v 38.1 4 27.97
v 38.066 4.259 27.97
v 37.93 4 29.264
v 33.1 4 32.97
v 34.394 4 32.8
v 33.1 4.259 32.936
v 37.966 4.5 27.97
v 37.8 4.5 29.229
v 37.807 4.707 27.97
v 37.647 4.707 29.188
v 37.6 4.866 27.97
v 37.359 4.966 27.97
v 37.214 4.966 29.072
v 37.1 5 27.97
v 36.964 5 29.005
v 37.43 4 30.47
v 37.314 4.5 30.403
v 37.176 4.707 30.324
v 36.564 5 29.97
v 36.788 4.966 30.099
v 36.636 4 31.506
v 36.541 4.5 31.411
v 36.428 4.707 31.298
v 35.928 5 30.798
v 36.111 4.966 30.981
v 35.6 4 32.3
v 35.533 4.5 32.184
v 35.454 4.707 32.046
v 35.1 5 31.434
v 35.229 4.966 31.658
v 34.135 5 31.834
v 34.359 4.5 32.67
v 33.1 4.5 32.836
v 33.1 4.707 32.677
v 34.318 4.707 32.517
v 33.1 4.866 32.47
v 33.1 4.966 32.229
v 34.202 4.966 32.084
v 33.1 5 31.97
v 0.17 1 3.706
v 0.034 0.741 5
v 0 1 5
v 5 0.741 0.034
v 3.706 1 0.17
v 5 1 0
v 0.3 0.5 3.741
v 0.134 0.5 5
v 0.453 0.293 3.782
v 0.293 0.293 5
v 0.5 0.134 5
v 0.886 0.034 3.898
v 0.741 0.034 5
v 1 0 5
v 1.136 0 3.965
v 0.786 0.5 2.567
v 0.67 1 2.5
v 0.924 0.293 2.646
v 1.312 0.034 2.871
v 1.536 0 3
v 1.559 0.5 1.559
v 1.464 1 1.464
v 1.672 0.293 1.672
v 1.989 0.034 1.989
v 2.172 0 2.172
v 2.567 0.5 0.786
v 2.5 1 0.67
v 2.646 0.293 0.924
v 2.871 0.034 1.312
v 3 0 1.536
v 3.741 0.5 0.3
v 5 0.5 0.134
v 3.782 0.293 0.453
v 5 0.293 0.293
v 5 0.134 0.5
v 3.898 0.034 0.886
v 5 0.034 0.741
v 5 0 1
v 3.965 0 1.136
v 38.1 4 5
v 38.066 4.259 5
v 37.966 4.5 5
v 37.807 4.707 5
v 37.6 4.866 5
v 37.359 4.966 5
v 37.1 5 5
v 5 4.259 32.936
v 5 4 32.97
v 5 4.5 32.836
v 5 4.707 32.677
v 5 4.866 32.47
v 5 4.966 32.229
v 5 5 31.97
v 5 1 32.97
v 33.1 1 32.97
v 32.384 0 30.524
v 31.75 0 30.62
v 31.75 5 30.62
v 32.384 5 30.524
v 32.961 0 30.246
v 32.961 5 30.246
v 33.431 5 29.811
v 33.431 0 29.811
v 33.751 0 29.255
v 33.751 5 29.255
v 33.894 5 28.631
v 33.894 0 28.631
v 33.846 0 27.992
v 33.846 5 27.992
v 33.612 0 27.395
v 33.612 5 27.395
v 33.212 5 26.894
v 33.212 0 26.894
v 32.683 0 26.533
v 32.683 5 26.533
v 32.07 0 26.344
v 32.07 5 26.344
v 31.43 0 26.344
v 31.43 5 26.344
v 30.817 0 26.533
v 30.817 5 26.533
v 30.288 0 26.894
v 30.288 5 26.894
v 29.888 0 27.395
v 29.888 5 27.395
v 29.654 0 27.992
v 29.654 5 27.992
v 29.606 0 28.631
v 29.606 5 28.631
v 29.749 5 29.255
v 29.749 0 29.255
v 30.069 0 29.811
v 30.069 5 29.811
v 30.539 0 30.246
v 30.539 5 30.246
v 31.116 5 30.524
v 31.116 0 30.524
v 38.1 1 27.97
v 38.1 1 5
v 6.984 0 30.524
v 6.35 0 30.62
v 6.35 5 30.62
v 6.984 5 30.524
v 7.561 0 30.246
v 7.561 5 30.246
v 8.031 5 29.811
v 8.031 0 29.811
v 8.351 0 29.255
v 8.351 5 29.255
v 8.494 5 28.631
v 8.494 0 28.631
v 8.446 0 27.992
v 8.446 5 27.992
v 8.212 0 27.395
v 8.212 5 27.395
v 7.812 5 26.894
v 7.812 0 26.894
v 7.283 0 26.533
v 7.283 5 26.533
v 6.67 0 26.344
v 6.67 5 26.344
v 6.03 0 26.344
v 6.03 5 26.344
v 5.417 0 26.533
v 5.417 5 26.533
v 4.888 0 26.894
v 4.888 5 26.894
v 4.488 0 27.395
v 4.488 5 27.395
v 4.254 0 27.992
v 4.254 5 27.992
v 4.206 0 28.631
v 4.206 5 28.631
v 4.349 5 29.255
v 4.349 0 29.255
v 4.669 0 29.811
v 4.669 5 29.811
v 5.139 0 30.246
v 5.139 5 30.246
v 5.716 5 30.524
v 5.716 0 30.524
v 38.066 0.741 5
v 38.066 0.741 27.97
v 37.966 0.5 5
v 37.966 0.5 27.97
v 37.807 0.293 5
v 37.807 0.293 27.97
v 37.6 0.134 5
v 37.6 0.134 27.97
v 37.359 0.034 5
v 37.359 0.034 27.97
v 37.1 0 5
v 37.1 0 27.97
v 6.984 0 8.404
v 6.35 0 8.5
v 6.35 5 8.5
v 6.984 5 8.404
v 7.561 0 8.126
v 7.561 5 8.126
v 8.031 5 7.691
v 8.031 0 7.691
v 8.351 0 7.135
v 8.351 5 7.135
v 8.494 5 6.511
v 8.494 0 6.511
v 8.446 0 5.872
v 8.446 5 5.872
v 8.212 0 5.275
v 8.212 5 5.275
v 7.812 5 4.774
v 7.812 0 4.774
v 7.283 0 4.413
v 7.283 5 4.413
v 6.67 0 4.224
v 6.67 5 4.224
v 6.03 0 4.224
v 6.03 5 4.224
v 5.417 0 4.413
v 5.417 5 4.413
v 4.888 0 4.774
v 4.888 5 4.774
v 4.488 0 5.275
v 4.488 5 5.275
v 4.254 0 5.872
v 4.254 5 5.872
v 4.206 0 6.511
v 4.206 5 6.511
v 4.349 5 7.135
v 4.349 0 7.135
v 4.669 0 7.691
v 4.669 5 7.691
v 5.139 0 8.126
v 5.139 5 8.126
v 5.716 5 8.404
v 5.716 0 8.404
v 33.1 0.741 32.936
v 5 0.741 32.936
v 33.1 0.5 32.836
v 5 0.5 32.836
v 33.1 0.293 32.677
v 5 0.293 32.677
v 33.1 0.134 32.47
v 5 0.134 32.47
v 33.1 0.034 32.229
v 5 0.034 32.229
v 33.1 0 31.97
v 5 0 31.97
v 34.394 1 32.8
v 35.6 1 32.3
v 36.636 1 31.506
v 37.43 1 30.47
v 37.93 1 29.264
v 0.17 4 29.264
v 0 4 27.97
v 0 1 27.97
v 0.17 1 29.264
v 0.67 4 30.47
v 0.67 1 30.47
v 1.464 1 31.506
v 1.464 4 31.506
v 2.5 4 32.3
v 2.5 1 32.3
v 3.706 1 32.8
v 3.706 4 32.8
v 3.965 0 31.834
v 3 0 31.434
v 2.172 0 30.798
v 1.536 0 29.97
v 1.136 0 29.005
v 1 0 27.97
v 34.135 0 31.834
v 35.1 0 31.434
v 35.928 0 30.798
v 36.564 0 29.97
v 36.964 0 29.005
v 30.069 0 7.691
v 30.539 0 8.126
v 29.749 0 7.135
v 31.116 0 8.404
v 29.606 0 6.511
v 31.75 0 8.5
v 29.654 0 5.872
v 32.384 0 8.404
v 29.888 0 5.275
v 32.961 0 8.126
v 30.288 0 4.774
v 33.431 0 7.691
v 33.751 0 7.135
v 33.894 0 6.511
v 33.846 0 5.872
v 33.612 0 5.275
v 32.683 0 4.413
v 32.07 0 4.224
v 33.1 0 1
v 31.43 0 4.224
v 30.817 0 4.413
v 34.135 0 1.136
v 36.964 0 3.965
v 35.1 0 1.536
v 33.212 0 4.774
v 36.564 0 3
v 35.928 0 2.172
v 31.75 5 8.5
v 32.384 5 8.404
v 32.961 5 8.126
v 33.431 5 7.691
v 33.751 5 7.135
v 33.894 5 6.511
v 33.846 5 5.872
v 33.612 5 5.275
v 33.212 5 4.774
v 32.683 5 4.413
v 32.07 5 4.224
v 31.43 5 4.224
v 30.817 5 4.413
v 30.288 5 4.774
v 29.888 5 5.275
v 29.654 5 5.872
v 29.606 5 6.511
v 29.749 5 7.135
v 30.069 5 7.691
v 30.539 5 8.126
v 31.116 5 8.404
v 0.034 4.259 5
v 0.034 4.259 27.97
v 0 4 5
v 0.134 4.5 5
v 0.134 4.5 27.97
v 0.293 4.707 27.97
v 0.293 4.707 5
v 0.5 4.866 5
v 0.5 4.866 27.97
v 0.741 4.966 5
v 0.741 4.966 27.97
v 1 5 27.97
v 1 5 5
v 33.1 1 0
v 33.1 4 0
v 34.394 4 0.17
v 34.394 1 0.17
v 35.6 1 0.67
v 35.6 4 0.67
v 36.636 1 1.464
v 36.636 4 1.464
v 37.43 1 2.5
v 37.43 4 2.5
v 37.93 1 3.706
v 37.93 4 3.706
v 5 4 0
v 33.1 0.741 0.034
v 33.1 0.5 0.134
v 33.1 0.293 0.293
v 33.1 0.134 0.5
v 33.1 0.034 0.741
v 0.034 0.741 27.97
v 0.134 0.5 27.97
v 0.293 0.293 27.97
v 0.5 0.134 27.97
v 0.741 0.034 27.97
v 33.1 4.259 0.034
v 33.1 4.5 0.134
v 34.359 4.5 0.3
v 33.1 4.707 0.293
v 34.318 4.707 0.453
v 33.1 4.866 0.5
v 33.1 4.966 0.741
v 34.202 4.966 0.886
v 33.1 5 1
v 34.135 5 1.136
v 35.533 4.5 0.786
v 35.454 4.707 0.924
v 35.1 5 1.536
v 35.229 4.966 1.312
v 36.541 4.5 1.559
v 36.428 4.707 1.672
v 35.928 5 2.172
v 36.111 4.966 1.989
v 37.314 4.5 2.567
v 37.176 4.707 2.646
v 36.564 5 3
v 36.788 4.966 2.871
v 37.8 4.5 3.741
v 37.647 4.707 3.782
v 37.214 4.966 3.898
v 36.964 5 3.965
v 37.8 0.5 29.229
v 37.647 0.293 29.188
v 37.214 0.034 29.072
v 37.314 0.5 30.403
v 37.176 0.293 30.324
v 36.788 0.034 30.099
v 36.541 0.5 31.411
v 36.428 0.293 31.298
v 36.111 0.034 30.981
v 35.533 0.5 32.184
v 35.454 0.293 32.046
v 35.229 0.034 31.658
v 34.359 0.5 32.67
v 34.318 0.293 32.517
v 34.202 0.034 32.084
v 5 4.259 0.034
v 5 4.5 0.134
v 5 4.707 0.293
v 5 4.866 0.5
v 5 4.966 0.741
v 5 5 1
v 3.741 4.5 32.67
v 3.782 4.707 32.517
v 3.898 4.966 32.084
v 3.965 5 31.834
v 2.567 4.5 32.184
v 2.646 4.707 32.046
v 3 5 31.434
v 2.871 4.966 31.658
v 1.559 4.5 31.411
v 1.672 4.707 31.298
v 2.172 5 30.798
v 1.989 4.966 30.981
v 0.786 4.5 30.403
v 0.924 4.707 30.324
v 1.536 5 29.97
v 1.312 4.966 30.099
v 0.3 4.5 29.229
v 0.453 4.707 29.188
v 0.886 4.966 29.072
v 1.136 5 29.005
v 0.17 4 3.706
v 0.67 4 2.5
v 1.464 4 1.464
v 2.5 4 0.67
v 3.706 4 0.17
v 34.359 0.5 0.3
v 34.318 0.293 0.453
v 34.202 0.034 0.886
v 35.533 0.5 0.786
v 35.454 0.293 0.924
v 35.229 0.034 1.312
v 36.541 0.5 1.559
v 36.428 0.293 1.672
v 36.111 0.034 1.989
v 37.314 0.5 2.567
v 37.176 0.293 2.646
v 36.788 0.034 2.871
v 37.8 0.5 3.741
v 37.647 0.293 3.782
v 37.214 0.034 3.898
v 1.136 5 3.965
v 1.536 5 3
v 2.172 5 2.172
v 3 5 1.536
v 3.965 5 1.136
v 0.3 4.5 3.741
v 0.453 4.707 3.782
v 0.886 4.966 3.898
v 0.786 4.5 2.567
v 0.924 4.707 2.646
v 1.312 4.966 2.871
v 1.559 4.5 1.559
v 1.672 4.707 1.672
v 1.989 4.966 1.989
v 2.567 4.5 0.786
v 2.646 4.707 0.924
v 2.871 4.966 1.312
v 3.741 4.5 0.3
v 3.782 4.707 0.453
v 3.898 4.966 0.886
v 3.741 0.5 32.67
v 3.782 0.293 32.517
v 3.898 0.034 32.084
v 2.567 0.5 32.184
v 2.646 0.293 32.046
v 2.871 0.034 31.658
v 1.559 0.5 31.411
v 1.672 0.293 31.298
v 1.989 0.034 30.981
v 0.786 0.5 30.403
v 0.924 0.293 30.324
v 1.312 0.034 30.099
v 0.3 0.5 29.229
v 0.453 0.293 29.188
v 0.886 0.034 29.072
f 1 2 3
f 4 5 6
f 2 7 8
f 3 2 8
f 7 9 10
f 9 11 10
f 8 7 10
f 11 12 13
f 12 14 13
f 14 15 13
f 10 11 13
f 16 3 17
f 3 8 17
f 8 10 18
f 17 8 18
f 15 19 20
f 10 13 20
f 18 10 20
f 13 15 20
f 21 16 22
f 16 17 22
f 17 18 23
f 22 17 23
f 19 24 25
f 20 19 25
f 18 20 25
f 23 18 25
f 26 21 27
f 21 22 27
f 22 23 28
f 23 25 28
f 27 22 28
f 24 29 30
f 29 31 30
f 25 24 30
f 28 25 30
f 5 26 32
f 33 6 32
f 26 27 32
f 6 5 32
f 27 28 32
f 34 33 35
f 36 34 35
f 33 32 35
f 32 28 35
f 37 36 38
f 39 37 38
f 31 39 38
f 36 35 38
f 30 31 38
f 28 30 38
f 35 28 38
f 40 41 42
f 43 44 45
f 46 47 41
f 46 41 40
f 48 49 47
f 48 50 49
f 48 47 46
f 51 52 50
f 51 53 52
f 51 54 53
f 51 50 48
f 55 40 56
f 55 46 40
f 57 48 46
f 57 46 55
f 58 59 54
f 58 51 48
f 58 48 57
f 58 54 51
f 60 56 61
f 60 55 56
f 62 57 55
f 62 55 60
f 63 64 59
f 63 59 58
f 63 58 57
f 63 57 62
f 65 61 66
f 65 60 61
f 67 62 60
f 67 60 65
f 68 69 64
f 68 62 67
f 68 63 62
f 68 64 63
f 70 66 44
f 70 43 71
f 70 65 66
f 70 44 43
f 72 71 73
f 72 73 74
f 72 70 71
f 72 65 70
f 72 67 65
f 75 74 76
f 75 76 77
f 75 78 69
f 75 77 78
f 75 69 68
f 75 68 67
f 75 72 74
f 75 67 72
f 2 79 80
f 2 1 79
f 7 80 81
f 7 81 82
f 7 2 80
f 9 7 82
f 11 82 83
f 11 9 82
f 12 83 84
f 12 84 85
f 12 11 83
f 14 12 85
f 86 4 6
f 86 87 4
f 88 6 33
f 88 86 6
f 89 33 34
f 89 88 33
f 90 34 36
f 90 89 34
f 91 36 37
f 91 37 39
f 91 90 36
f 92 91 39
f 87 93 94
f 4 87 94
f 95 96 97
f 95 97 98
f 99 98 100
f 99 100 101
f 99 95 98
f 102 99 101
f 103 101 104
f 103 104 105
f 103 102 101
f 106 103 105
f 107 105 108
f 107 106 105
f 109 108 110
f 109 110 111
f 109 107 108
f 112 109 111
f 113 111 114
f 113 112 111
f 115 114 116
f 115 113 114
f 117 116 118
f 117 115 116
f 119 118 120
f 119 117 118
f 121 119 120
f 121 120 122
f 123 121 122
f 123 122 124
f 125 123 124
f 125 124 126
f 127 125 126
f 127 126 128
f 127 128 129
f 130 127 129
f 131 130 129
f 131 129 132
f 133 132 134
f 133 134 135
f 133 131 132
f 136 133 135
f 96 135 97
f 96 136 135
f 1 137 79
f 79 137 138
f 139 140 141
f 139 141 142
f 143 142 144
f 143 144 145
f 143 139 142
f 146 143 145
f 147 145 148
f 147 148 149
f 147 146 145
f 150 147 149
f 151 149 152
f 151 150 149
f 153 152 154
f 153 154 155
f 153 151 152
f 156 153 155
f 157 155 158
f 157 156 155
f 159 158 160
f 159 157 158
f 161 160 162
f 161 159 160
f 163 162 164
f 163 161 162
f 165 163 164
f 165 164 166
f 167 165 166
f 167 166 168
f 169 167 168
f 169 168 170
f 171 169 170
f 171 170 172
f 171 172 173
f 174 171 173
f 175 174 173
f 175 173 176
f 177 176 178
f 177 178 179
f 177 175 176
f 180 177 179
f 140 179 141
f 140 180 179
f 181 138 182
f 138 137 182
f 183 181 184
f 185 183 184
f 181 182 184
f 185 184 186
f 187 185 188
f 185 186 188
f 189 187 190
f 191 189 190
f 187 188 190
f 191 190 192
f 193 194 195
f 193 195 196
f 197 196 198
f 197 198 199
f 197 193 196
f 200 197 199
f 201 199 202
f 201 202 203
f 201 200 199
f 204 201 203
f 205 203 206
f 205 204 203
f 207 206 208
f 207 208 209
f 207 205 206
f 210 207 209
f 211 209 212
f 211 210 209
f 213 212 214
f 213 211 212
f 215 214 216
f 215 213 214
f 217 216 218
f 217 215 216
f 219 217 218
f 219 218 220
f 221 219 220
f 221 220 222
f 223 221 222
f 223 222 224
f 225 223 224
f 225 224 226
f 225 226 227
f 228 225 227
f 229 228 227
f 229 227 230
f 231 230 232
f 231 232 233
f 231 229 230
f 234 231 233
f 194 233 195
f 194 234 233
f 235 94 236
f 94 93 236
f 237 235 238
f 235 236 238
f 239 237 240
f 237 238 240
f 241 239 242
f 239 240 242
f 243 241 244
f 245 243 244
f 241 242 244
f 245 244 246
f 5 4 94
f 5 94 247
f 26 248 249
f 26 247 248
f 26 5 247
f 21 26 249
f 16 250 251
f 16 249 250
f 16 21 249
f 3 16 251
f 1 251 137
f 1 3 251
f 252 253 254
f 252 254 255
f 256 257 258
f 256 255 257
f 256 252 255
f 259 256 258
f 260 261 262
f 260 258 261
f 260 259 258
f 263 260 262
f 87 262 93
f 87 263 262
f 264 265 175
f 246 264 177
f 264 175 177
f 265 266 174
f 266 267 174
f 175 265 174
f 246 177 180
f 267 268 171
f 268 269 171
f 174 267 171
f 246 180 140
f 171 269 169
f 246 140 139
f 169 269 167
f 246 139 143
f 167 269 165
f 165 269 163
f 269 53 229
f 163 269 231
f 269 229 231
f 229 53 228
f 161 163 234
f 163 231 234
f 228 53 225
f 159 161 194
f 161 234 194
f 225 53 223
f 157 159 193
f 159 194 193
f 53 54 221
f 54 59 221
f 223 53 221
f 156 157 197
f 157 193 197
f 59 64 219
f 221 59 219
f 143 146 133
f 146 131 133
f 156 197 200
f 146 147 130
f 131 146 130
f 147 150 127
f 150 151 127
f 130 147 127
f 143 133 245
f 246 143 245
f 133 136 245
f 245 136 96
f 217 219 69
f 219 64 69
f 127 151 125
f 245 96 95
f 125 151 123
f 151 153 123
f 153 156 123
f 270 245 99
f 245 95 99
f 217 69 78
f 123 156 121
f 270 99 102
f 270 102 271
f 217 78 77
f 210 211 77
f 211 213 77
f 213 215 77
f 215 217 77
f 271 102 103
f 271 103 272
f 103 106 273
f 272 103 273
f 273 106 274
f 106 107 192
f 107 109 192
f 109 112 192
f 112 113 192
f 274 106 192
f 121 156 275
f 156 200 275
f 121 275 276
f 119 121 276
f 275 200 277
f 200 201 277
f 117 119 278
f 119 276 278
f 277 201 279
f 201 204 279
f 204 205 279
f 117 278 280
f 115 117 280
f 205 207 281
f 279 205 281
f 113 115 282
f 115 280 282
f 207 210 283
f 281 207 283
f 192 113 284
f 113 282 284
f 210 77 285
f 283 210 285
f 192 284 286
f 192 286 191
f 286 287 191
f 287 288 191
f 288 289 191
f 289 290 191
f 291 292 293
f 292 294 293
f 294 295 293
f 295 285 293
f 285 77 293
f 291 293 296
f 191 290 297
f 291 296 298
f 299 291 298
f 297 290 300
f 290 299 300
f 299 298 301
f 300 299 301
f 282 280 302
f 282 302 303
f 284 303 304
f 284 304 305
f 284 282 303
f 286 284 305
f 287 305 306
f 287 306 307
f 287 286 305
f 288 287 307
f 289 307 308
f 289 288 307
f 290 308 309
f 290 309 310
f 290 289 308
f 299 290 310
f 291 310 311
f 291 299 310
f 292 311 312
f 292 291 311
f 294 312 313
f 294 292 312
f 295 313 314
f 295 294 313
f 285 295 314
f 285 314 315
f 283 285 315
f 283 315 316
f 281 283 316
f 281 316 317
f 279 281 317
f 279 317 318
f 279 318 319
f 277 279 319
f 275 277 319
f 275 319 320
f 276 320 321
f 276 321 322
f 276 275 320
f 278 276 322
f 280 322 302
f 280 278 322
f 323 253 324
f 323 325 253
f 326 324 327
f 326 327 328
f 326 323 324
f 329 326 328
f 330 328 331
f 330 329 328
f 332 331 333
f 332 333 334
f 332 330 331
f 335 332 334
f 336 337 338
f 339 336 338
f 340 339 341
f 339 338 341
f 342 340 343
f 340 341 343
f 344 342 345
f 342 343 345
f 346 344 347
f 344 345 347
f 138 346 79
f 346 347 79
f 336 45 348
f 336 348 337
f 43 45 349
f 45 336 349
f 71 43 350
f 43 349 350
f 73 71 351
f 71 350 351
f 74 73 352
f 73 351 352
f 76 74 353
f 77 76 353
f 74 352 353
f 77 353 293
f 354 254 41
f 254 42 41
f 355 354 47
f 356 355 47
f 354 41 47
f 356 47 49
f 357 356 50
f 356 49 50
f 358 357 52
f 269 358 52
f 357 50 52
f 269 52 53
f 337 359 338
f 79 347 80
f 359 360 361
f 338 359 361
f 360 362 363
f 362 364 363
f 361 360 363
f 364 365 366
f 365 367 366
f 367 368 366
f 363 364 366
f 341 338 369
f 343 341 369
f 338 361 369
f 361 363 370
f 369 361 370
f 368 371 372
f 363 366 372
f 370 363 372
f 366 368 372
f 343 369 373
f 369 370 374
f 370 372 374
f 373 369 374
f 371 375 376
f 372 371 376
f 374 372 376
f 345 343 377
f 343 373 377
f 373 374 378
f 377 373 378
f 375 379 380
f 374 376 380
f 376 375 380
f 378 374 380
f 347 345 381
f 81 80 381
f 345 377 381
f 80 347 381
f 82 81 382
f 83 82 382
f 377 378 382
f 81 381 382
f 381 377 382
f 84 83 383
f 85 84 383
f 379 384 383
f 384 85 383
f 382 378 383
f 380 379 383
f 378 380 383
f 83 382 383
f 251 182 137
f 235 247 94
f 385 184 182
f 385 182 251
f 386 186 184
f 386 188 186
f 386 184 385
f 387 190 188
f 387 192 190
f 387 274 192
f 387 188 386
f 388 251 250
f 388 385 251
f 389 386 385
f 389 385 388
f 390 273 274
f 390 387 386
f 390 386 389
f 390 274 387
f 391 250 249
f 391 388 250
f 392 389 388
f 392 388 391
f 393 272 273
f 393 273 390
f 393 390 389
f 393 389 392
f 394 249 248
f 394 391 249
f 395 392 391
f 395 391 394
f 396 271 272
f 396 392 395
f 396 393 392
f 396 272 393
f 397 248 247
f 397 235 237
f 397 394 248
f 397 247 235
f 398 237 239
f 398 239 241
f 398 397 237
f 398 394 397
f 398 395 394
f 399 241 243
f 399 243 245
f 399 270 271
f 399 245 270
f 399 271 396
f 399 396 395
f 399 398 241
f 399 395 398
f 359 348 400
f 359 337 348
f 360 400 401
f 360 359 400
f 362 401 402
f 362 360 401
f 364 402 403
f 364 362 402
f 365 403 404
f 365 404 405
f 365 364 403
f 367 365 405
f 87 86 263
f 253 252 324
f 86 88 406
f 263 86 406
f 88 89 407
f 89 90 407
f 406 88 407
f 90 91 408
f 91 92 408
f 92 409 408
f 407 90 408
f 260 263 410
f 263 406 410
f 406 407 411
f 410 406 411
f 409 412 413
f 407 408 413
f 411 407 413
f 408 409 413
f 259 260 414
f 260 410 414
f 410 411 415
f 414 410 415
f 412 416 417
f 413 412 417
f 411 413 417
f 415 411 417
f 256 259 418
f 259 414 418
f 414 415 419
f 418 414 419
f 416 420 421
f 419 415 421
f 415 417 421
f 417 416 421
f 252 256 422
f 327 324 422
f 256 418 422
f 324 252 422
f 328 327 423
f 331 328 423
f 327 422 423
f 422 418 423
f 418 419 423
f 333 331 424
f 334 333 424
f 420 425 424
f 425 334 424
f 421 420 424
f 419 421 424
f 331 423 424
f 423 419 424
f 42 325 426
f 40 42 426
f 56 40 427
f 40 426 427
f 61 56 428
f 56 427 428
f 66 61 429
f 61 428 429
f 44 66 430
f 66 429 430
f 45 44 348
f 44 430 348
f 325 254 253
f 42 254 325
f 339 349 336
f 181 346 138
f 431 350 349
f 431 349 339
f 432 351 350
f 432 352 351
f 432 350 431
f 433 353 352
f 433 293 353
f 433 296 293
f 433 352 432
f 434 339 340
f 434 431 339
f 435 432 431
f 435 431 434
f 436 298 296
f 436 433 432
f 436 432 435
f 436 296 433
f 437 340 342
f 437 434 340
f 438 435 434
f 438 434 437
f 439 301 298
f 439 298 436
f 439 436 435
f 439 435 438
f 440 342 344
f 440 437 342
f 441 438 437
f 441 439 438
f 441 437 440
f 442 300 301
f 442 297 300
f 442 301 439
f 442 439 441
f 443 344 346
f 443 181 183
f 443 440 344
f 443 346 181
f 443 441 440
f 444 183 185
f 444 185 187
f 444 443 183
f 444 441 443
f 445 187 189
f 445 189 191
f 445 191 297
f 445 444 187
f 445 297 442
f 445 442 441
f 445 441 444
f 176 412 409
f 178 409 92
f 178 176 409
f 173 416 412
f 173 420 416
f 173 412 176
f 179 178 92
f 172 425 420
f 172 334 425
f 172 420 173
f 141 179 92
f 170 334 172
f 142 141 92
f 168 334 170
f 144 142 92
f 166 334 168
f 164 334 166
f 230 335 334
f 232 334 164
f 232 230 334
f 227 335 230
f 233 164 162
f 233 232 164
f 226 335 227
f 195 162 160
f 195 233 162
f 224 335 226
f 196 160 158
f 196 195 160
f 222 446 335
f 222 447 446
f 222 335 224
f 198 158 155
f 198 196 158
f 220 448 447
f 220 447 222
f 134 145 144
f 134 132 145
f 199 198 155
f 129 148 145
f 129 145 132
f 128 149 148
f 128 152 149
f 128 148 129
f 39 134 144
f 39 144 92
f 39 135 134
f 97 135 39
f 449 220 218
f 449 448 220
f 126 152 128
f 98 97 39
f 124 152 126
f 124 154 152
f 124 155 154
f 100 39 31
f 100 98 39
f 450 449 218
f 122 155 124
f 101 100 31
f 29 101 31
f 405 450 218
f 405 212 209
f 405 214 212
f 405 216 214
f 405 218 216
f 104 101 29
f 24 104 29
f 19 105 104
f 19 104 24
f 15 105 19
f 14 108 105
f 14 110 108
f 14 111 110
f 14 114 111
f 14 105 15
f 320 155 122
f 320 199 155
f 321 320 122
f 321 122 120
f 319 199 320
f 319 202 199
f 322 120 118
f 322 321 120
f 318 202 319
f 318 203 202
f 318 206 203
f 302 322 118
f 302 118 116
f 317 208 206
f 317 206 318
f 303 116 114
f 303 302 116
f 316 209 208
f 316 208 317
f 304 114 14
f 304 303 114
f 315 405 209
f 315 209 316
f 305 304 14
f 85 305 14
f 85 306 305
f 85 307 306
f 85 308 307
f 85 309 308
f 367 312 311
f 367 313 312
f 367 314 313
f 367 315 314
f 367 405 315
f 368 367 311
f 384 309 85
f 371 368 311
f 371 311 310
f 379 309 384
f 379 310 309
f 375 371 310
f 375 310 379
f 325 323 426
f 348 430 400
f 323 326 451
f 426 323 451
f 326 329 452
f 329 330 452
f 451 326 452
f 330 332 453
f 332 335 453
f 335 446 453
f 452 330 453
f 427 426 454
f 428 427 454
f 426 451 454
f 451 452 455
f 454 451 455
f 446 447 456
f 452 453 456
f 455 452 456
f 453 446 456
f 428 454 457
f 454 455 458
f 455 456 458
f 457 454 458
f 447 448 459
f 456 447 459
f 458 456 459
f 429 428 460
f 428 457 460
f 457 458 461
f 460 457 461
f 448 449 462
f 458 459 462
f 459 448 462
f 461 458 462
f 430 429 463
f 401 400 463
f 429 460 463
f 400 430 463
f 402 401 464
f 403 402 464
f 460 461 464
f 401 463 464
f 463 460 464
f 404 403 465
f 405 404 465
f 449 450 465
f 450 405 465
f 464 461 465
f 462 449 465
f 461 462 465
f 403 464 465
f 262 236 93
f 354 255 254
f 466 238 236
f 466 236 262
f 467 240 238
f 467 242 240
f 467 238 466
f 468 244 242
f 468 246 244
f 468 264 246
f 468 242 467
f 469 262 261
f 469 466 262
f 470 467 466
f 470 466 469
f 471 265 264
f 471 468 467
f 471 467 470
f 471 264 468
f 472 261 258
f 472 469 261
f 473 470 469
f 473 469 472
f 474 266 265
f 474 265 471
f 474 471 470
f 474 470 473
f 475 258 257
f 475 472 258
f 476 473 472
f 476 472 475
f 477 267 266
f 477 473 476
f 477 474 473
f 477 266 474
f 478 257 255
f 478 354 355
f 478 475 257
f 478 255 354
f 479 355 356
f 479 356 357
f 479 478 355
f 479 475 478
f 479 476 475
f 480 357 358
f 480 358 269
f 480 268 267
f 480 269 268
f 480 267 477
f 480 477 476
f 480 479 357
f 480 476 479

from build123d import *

# Parameters (mm, degrees)
SKETCH1_W           = 38.1
SKETCH1_H           = 32.97
SKETCH1_R           = 2.15
BOSS_EXTRUDE1_DEPTH = 5
FILLET1_R           = 5
FILLET2_R           = 1


with BuildPart() as part:
    # Sketch1 → Boss-Extrude1 (new body)
    with BuildSketch(Plane(origin=(0, 0, 0), x_dir=(1, 0, 0), z_dir=(0, 1, 0))):
        with Locations((19.05, -16.485)):
            Rectangle(SKETCH1_W, SKETCH1_H)
        with Locations(Location((6.35, -6.35, 0), (0, 0, 270))):
            Circle(SKETCH1_R, mode=Mode.SUBTRACT)
        with Locations(Location((31.75, -6.35, 0), (0, 0, 270))):
            Circle(SKETCH1_R, mode=Mode.SUBTRACT)
        with Locations(Location((31.75, -28.47, 0), (0, 0, 270))):
            Circle(SKETCH1_R, mode=Mode.SUBTRACT)
        with Locations(Location((6.35, -28.47, 0), (0, 0, 270))):
            Circle(SKETCH1_R, mode=Mode.SUBTRACT)
    extrude(amount=BOSS_EXTRUDE1_DEPTH)

    # Fillet1
    fillet1_edges = [part.edges().sort_by_distance(p)[0] for p in [
        (0, 2.5, 0),
        (38.1, 2.5, 0),
        (38.1, 2.5, 32.97),
        (0, 2.5, 32.97),
    ]]
    fillet(fillet1_edges, radius=FILLET1_R)

    # Fillet2
    fillet2_edges = [part.edges().sort_by_distance(p)[0] for p in [
        (0, 0, 16.485),
        (0, 5, 16.485),
        (19.05, 0, 0),
        (38.1, 0, 16.485),
        (19.05, 0, 32.97),
        (1.464466094, 0, 31.505533906),
        (36.635533906, 0, 31.505533906),
        (36.635533906, 0, 1.464466094),
        (1.464466094, 0, 1.464466094),
        (19.05, 5, 0),
        (19.05, 5, 32.97),
        (38.1, 5, 16.485),
        (1.464466094, 5, 31.505533906),
        (36.635533906, 5, 31.505533906),
        (36.635533906, 5, 1.464466094),
        (1.464466094, 5, 1.464466094),
    ]]
    fillet(fillet2_edges, radius=FILLET2_R)


solid = part.part
